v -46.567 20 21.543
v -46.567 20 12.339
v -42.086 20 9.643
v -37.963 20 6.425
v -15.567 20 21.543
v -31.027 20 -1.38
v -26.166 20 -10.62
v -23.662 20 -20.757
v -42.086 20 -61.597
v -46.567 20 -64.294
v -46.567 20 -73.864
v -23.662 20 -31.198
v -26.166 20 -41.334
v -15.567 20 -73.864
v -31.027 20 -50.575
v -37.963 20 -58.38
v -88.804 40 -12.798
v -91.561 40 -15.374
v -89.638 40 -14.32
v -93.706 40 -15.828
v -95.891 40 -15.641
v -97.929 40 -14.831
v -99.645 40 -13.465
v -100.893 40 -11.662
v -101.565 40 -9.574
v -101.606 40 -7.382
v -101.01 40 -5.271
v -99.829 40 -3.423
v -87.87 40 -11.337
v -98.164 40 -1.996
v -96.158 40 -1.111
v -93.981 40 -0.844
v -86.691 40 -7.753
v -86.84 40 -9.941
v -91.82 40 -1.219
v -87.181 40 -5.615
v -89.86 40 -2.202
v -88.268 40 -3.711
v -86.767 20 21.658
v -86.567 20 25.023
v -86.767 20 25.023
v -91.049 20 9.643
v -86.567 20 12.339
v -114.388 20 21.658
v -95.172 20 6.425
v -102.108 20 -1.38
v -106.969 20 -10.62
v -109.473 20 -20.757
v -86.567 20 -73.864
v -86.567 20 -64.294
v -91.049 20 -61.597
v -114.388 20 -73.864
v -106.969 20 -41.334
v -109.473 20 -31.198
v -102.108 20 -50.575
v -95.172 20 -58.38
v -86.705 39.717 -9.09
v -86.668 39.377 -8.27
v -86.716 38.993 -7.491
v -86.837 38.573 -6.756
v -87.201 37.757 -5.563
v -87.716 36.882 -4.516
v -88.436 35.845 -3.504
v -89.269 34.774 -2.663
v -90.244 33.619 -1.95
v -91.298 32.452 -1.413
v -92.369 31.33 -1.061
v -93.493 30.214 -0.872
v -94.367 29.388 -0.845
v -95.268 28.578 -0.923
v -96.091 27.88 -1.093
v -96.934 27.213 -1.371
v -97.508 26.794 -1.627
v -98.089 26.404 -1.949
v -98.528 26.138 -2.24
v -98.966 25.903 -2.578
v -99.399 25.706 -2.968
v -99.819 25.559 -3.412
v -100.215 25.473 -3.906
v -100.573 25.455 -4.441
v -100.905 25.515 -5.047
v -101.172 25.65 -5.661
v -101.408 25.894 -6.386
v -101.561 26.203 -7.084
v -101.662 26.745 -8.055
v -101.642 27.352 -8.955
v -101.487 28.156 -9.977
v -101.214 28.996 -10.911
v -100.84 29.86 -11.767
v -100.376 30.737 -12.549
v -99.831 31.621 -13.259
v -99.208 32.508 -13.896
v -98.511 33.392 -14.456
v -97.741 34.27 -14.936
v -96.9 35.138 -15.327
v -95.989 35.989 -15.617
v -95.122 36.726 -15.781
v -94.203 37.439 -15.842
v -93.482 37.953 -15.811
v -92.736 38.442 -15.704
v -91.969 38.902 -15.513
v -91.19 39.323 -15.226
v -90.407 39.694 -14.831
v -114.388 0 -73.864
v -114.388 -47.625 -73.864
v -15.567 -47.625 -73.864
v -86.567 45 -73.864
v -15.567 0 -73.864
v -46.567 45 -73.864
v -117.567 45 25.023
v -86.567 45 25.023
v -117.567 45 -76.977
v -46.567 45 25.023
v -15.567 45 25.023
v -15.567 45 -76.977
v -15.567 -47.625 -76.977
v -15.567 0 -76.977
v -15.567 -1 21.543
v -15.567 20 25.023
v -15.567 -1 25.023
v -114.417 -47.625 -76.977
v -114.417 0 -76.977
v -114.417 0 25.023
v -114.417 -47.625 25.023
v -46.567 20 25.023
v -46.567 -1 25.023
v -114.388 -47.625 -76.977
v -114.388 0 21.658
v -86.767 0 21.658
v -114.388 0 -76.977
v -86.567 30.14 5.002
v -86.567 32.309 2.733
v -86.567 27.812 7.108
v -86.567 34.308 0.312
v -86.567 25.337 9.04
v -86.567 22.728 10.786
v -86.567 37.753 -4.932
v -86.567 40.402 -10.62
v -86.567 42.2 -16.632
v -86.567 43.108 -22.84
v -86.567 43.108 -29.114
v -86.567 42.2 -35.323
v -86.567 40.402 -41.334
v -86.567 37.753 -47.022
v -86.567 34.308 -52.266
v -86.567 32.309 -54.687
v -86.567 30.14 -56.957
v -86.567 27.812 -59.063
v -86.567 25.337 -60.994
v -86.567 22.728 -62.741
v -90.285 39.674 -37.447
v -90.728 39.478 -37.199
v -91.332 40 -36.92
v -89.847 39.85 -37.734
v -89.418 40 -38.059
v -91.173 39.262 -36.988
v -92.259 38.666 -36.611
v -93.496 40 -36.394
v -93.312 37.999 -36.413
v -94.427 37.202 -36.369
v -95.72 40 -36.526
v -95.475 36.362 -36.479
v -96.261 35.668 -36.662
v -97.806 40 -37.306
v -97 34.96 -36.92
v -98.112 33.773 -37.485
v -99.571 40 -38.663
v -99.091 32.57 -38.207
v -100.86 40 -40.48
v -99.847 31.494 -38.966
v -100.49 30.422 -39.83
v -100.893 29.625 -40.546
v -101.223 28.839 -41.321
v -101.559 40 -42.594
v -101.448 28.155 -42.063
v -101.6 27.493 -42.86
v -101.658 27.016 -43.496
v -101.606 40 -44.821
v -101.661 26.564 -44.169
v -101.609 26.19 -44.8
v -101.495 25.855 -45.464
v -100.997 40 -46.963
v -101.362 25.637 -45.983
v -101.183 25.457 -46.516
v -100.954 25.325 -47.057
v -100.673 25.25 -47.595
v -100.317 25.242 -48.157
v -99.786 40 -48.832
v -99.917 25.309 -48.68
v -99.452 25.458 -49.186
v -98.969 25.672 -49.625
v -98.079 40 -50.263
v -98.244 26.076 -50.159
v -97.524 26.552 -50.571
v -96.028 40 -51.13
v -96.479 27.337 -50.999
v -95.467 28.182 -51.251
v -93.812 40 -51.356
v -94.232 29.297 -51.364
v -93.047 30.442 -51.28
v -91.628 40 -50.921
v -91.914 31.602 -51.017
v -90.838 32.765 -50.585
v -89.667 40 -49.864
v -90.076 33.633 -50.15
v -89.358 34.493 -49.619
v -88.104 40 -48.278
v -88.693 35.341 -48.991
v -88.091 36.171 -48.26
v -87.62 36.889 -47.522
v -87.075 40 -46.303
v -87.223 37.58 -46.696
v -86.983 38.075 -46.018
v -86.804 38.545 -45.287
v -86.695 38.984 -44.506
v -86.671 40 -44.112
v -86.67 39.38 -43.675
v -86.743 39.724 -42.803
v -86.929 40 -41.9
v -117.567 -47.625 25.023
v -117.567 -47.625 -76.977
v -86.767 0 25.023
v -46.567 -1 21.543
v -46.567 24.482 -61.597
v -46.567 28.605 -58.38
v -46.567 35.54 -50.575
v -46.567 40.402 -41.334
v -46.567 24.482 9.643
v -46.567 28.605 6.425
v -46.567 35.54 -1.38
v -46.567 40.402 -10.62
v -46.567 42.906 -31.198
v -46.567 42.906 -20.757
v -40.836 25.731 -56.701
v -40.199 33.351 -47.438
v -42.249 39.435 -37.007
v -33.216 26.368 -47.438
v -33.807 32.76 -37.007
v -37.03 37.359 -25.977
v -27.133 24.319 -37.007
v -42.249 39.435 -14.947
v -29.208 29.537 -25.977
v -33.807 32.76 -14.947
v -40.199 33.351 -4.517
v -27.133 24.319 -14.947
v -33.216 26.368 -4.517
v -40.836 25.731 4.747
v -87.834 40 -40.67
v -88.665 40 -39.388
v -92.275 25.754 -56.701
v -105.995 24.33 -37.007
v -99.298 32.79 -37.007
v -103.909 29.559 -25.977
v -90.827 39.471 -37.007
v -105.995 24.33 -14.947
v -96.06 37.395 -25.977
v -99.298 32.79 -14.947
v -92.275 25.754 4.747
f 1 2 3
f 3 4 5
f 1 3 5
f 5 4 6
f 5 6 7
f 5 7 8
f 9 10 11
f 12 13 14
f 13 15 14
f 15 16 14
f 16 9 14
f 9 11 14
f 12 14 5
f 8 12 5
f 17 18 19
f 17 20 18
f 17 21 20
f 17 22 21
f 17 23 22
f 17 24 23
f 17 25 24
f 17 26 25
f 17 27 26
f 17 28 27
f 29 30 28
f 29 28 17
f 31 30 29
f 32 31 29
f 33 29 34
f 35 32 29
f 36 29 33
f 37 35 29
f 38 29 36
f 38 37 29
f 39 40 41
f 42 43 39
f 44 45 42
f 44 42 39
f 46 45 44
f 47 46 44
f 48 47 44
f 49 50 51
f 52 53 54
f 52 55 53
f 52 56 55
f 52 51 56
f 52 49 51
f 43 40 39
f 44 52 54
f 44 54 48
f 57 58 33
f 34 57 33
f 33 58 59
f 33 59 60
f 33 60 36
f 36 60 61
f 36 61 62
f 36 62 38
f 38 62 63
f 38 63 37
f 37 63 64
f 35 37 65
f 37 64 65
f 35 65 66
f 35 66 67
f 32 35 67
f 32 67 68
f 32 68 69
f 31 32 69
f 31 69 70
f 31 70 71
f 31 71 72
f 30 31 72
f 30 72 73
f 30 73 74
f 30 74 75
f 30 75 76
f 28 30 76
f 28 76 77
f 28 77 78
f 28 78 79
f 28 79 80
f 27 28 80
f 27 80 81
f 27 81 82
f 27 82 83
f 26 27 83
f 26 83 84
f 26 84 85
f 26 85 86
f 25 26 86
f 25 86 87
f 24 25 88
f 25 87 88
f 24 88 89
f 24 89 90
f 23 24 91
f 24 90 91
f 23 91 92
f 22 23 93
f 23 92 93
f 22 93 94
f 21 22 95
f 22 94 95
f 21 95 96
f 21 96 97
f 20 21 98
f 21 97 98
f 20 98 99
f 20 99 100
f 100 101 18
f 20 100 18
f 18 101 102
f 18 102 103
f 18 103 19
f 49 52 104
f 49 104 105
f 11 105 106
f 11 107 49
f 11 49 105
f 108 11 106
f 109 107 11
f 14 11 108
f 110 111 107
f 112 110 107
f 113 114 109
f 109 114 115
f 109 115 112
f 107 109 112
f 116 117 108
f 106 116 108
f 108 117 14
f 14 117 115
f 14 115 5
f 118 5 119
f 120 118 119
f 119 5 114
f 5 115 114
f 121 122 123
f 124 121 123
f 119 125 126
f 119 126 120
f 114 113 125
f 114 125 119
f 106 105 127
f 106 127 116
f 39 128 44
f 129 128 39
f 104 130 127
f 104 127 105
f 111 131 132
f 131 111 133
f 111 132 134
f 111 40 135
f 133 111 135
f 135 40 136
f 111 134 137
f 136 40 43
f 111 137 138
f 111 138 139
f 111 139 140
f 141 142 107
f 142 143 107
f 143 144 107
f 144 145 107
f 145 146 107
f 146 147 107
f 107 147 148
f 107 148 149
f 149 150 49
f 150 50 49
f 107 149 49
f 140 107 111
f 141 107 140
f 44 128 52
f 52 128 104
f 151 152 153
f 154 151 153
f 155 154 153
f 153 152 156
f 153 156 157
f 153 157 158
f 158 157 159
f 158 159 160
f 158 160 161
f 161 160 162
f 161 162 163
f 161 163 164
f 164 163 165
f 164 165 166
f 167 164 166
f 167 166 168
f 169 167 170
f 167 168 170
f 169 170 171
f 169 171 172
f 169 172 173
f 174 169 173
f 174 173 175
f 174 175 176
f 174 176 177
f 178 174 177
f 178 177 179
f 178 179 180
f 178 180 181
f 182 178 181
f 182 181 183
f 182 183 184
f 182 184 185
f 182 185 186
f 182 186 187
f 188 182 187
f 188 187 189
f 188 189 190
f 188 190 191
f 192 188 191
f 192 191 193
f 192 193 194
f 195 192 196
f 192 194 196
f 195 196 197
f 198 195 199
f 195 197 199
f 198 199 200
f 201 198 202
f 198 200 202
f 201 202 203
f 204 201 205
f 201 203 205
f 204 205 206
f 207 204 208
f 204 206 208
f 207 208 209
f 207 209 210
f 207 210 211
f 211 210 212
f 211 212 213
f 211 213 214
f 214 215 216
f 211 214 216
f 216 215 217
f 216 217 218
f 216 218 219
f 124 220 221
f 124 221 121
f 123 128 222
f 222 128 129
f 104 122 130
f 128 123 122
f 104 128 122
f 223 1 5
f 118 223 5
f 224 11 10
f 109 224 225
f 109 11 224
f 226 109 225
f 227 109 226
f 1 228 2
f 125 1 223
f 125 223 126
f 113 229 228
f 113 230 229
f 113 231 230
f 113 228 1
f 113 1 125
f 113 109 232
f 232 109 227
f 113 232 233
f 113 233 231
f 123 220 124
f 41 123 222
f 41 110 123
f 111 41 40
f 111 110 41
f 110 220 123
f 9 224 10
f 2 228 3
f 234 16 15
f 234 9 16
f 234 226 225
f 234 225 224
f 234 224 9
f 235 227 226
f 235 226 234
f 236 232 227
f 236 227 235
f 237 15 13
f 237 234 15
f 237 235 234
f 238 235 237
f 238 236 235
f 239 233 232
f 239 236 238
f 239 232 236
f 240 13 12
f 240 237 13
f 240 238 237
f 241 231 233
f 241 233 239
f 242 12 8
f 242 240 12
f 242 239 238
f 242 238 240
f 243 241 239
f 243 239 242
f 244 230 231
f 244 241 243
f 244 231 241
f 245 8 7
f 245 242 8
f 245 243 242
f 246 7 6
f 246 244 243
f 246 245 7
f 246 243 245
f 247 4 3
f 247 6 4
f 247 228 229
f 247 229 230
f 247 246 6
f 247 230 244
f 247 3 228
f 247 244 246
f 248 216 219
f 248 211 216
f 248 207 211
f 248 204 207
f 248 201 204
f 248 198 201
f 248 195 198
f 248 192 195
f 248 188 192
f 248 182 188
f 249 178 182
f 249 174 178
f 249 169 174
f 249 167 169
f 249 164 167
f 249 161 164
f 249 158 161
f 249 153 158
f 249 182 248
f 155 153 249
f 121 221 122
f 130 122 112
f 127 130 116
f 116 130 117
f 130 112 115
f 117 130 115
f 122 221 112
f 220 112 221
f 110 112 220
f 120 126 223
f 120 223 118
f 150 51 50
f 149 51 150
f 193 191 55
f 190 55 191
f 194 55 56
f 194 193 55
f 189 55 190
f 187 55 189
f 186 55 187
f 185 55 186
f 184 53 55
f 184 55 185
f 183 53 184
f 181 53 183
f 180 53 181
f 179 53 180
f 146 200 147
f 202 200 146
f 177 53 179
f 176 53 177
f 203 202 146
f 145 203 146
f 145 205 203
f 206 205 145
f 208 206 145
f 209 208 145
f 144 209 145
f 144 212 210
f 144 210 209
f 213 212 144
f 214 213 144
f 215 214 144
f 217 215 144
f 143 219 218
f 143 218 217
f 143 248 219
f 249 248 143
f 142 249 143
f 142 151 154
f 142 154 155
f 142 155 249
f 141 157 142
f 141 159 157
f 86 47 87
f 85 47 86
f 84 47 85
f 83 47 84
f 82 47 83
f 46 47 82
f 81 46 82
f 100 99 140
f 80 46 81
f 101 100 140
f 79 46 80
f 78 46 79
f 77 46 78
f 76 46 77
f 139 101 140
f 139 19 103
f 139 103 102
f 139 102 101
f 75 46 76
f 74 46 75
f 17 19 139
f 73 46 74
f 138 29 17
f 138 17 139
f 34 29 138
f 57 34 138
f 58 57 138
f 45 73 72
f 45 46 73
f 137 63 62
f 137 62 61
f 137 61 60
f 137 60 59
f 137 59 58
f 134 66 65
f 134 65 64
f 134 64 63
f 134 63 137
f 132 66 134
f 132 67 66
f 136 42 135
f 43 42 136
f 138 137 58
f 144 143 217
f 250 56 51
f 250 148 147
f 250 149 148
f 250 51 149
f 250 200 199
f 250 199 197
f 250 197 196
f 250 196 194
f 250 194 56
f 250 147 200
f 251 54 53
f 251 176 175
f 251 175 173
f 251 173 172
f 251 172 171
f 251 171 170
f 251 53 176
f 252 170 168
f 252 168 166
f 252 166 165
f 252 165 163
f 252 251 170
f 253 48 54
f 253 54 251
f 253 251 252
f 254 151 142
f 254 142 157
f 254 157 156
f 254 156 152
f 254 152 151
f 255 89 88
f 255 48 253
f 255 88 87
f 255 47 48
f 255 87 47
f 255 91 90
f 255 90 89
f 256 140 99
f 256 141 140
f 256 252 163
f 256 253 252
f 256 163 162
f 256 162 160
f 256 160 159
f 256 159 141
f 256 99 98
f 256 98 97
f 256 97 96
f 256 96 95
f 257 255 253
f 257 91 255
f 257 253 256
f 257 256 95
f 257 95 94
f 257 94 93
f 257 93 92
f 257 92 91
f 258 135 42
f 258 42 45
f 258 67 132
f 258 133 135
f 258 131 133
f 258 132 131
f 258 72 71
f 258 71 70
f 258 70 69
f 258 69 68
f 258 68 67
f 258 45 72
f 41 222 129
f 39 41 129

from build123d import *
from build123d.topology import SkipClean

# Parameters (mm, degrees)
SKETCH1_W                   = 102
SKETCH1_H                   = 102
BOSS_EXTRUDE1_DEPTH         = 50
CUT_EXTRUDE_THIN1_OUTLINE_W = 40
CUT_EXTRUDE_THIN1_OUTLINE_H = 95.773670058
CUT_EXTRUDE_THIN1_DEPTH     = 50
SKETCH4_W                   = 40
SKETCH4_H                   = 6.202657501
CUT_EXTRUDE3_DEPTH          = 54
SKETCH5_W                   = 33.817621941
SKETCH5_H                   = 102.594578927
CUT_EXTRUDE4_DEPTH          = 20
SKETCH6_W                   = 27.820383201
SKETCH6_H                   = 98.886835029
CUT_EXTRUDE5_DEPTH          = 20
SKETCH7_W                   = 30.8
SKETCH7_H                   = 3.364819678
BOSS_EXTRUDE2_DEPTH         = 21
SKETCH9_W                   = 31
SKETCH9_H                   = 3.479961613
BOSS_EXTRUDE4_DEPTH         = 21
SKETCH10_W                  = 3.15002448
SKETCH10_H                  = 102
BOSS_EXTRUDE5_DEPTH         = 47.625
SKETCH11_W                  = 98.820383201
SKETCH11_H                  = 3.113164971
BOSS_EXTRUDE6_DEPTH         = 47.625
SKETCH14_W                  = 102
SKETCH14_H                  = 5
CUT_EXTRUDE7_DEPTH          = 105
SKETCH13_R                  = 7.5
CUT_EXTRUDE8_DEPTH          = 20
SKETCH13_4_R                = 7.5
CUT_EXTRUDE9_DEPTH          = 20


# Read off the part's stored shape, not the designer's step: Cut-Extrude-Thin1
with BuildPart() as part:
    # Sketch1 → Boss-Extrude1 (new body)
    with BuildSketch(Plane(origin=(0, 0, 0), x_dir=(1, 0, 0), z_dir=(0, 1, 0))):
        with Locations((-66.567363259, 25.977216604)):
            Rectangle(SKETCH1_W, SKETCH1_H)
    extrude(amount=BOSS_EXTRUDE1_DEPTH)

    # Sketch2 → Cut-Revolve1 (revolve, cut)
    with SkipClean():  # the faces are left unmerged after this step: merging them gives an invalid solid
        with BuildSketch(Plane(origin=(0, 0, 0), x_dir=(1, 0, 0), z_dir=(0, 1, 0))):
            with BuildLine():
                ThreePointArc((-66.567363259, 73.602216604), (-114.192363259, 25.977216604), (-66.567363259, -21.647783396))
                Line((-66.567363259, -21.647783396), (-66.567363259, 73.602216604))
            make_face()
            with BuildLine():
                Line((-66.567363259, 73.602216604), (-66.567363259, -21.647783396))
                ThreePointArc((-66.567363259, -21.647783396), (-32.891402805, -7.69874385), (-18.942363259, 25.977216604))
                ThreePointArc((-18.942363259, 25.977216604), (-32.891402805, 59.653177058), (-66.567363259, 73.602216604))
            make_face()
        revolve(axis=Axis((-66.567363259, 0, 21.647783396), (0, 0, -1)), mode=Mode.SUBTRACT)
    add(part.part.scale(1), mode=Mode.REPLACE)  # the faces are merged on a copy

    # Cut-Extrude-Thin1 outline → Cut-Extrude-Thin1 (cut)
    with BuildSketch(Plane(origin=(0, 0, 0), x_dir=(1, 0, 0), z_dir=(0, 1, 0))):
        with Locations((-66.567363259, 25.977216604)):
            Rectangle(CUT_EXTRUDE_THIN1_OUTLINE_W, CUT_EXTRUDE_THIN1_OUTLINE_H)
    extrude(amount=CUT_EXTRUDE_THIN1_DEPTH, mode=Mode.SUBTRACT)

    # Sketch4 → Cut-Extrude3 (cut)
    with BuildSketch(Plane(origin=(0, 0, 0), x_dir=(1, 0, 0), z_dir=(0, 1, 0))):
        with Locations((-66.567363259, -25.010947176)):
            Rectangle(SKETCH4_W, SKETCH4_H)
    extrude(amount=CUT_EXTRUDE3_DEPTH, mode=Mode.SUBTRACT)

    # Sketch5 → Cut-Extrude4 (cut)
    with BuildSketch(Plane(origin=(0, 0, 0), x_dir=(1, 0, 0), z_dir=(0, 1, 0))):
        with Locations((-29.658552289, 22.56676217)):
            Rectangle(SKETCH5_W, SKETCH5_H)
    extrude(amount=CUT_EXTRUDE4_DEPTH, mode=Mode.SUBTRACT)

    # Sketch6 → Cut-Extrude5 (cut)
    with BuildSketch(Plane(origin=(0, 0, 0), x_dir=(-1, 0, 0), z_dir=(0, -1, 0))):
        with Locations((100.47755486, 24.420634119)):
            Rectangle(SKETCH6_W, SKETCH6_H)
    extrude(amount=-CUT_EXTRUDE5_DEPTH, mode=Mode.SUBTRACT)

    # Sketch7 → Boss-Extrude2 (add)
    with BuildSketch(Plane(origin=(0, 0, 0), x_dir=(1, 0, 0), z_dir=(0, 1, 0))):
        with Locations((-102.167363259, -23.340373557)):
            Rectangle(SKETCH7_W, SKETCH7_H)
    extrude(amount=BOSS_EXTRUDE2_DEPTH)

    # Sketch9 → Boss-Extrude4 (add)
    with BuildSketch(Plane.XZ.offset(-20)):
        with Locations((-31.067363259, 23.28280259)):
            Rectangle(SKETCH9_W, SKETCH9_H)
    extrude(amount=BOSS_EXTRUDE4_DEPTH)

    # Sketch10 → Boss-Extrude5 (add)
    with BuildSketch(Plane.XZ):
        with Locations((-115.992351019, -25.977216604)):
            Rectangle(SKETCH10_W, SKETCH10_H)
    extrude(amount=BOSS_EXTRUDE5_DEPTH)

    # Sketch11 → Boss-Extrude6 (add)
    with BuildSketch(Plane.XZ):
        with Locations((-64.97755486, -75.420634119)):
            Rectangle(SKETCH11_W, SKETCH11_H)
    extrude(amount=BOSS_EXTRUDE6_DEPTH)

    # Sketch14 → Cut-Extrude7 (cut)
    with BuildSketch(Plane(origin=(-15.567363259, 0, 0), x_dir=(0, 0, -1), z_dir=(1, 0, 0))):
        with Locations((25.977216604, 47.5)):
            Rectangle(SKETCH14_W, SKETCH14_H)
    extrude(amount=-CUT_EXTRUDE7_DEPTH, mode=Mode.SUBTRACT)

    # Sketch13 → Cut-Extrude8 (cut)
    with BuildSketch(Plane.XZ.offset(-20)):
        with Locations((-94.167363259, -8.342036282)):
            Circle(SKETCH13_R)
    extrude(amount=-CUT_EXTRUDE8_DEPTH, mode=Mode.SUBTRACT)

    # Sketch13<4> → Cut-Extrude9 (cut)
    with BuildSketch(Plane.XZ.offset(-20)):
        with Locations((-94.167363259, -43.864051633)):
            Circle(SKETCH13_4_R)
    extrude(amount=-CUT_EXTRUDE9_DEPTH, mode=Mode.SUBTRACT)


solid = part.part
